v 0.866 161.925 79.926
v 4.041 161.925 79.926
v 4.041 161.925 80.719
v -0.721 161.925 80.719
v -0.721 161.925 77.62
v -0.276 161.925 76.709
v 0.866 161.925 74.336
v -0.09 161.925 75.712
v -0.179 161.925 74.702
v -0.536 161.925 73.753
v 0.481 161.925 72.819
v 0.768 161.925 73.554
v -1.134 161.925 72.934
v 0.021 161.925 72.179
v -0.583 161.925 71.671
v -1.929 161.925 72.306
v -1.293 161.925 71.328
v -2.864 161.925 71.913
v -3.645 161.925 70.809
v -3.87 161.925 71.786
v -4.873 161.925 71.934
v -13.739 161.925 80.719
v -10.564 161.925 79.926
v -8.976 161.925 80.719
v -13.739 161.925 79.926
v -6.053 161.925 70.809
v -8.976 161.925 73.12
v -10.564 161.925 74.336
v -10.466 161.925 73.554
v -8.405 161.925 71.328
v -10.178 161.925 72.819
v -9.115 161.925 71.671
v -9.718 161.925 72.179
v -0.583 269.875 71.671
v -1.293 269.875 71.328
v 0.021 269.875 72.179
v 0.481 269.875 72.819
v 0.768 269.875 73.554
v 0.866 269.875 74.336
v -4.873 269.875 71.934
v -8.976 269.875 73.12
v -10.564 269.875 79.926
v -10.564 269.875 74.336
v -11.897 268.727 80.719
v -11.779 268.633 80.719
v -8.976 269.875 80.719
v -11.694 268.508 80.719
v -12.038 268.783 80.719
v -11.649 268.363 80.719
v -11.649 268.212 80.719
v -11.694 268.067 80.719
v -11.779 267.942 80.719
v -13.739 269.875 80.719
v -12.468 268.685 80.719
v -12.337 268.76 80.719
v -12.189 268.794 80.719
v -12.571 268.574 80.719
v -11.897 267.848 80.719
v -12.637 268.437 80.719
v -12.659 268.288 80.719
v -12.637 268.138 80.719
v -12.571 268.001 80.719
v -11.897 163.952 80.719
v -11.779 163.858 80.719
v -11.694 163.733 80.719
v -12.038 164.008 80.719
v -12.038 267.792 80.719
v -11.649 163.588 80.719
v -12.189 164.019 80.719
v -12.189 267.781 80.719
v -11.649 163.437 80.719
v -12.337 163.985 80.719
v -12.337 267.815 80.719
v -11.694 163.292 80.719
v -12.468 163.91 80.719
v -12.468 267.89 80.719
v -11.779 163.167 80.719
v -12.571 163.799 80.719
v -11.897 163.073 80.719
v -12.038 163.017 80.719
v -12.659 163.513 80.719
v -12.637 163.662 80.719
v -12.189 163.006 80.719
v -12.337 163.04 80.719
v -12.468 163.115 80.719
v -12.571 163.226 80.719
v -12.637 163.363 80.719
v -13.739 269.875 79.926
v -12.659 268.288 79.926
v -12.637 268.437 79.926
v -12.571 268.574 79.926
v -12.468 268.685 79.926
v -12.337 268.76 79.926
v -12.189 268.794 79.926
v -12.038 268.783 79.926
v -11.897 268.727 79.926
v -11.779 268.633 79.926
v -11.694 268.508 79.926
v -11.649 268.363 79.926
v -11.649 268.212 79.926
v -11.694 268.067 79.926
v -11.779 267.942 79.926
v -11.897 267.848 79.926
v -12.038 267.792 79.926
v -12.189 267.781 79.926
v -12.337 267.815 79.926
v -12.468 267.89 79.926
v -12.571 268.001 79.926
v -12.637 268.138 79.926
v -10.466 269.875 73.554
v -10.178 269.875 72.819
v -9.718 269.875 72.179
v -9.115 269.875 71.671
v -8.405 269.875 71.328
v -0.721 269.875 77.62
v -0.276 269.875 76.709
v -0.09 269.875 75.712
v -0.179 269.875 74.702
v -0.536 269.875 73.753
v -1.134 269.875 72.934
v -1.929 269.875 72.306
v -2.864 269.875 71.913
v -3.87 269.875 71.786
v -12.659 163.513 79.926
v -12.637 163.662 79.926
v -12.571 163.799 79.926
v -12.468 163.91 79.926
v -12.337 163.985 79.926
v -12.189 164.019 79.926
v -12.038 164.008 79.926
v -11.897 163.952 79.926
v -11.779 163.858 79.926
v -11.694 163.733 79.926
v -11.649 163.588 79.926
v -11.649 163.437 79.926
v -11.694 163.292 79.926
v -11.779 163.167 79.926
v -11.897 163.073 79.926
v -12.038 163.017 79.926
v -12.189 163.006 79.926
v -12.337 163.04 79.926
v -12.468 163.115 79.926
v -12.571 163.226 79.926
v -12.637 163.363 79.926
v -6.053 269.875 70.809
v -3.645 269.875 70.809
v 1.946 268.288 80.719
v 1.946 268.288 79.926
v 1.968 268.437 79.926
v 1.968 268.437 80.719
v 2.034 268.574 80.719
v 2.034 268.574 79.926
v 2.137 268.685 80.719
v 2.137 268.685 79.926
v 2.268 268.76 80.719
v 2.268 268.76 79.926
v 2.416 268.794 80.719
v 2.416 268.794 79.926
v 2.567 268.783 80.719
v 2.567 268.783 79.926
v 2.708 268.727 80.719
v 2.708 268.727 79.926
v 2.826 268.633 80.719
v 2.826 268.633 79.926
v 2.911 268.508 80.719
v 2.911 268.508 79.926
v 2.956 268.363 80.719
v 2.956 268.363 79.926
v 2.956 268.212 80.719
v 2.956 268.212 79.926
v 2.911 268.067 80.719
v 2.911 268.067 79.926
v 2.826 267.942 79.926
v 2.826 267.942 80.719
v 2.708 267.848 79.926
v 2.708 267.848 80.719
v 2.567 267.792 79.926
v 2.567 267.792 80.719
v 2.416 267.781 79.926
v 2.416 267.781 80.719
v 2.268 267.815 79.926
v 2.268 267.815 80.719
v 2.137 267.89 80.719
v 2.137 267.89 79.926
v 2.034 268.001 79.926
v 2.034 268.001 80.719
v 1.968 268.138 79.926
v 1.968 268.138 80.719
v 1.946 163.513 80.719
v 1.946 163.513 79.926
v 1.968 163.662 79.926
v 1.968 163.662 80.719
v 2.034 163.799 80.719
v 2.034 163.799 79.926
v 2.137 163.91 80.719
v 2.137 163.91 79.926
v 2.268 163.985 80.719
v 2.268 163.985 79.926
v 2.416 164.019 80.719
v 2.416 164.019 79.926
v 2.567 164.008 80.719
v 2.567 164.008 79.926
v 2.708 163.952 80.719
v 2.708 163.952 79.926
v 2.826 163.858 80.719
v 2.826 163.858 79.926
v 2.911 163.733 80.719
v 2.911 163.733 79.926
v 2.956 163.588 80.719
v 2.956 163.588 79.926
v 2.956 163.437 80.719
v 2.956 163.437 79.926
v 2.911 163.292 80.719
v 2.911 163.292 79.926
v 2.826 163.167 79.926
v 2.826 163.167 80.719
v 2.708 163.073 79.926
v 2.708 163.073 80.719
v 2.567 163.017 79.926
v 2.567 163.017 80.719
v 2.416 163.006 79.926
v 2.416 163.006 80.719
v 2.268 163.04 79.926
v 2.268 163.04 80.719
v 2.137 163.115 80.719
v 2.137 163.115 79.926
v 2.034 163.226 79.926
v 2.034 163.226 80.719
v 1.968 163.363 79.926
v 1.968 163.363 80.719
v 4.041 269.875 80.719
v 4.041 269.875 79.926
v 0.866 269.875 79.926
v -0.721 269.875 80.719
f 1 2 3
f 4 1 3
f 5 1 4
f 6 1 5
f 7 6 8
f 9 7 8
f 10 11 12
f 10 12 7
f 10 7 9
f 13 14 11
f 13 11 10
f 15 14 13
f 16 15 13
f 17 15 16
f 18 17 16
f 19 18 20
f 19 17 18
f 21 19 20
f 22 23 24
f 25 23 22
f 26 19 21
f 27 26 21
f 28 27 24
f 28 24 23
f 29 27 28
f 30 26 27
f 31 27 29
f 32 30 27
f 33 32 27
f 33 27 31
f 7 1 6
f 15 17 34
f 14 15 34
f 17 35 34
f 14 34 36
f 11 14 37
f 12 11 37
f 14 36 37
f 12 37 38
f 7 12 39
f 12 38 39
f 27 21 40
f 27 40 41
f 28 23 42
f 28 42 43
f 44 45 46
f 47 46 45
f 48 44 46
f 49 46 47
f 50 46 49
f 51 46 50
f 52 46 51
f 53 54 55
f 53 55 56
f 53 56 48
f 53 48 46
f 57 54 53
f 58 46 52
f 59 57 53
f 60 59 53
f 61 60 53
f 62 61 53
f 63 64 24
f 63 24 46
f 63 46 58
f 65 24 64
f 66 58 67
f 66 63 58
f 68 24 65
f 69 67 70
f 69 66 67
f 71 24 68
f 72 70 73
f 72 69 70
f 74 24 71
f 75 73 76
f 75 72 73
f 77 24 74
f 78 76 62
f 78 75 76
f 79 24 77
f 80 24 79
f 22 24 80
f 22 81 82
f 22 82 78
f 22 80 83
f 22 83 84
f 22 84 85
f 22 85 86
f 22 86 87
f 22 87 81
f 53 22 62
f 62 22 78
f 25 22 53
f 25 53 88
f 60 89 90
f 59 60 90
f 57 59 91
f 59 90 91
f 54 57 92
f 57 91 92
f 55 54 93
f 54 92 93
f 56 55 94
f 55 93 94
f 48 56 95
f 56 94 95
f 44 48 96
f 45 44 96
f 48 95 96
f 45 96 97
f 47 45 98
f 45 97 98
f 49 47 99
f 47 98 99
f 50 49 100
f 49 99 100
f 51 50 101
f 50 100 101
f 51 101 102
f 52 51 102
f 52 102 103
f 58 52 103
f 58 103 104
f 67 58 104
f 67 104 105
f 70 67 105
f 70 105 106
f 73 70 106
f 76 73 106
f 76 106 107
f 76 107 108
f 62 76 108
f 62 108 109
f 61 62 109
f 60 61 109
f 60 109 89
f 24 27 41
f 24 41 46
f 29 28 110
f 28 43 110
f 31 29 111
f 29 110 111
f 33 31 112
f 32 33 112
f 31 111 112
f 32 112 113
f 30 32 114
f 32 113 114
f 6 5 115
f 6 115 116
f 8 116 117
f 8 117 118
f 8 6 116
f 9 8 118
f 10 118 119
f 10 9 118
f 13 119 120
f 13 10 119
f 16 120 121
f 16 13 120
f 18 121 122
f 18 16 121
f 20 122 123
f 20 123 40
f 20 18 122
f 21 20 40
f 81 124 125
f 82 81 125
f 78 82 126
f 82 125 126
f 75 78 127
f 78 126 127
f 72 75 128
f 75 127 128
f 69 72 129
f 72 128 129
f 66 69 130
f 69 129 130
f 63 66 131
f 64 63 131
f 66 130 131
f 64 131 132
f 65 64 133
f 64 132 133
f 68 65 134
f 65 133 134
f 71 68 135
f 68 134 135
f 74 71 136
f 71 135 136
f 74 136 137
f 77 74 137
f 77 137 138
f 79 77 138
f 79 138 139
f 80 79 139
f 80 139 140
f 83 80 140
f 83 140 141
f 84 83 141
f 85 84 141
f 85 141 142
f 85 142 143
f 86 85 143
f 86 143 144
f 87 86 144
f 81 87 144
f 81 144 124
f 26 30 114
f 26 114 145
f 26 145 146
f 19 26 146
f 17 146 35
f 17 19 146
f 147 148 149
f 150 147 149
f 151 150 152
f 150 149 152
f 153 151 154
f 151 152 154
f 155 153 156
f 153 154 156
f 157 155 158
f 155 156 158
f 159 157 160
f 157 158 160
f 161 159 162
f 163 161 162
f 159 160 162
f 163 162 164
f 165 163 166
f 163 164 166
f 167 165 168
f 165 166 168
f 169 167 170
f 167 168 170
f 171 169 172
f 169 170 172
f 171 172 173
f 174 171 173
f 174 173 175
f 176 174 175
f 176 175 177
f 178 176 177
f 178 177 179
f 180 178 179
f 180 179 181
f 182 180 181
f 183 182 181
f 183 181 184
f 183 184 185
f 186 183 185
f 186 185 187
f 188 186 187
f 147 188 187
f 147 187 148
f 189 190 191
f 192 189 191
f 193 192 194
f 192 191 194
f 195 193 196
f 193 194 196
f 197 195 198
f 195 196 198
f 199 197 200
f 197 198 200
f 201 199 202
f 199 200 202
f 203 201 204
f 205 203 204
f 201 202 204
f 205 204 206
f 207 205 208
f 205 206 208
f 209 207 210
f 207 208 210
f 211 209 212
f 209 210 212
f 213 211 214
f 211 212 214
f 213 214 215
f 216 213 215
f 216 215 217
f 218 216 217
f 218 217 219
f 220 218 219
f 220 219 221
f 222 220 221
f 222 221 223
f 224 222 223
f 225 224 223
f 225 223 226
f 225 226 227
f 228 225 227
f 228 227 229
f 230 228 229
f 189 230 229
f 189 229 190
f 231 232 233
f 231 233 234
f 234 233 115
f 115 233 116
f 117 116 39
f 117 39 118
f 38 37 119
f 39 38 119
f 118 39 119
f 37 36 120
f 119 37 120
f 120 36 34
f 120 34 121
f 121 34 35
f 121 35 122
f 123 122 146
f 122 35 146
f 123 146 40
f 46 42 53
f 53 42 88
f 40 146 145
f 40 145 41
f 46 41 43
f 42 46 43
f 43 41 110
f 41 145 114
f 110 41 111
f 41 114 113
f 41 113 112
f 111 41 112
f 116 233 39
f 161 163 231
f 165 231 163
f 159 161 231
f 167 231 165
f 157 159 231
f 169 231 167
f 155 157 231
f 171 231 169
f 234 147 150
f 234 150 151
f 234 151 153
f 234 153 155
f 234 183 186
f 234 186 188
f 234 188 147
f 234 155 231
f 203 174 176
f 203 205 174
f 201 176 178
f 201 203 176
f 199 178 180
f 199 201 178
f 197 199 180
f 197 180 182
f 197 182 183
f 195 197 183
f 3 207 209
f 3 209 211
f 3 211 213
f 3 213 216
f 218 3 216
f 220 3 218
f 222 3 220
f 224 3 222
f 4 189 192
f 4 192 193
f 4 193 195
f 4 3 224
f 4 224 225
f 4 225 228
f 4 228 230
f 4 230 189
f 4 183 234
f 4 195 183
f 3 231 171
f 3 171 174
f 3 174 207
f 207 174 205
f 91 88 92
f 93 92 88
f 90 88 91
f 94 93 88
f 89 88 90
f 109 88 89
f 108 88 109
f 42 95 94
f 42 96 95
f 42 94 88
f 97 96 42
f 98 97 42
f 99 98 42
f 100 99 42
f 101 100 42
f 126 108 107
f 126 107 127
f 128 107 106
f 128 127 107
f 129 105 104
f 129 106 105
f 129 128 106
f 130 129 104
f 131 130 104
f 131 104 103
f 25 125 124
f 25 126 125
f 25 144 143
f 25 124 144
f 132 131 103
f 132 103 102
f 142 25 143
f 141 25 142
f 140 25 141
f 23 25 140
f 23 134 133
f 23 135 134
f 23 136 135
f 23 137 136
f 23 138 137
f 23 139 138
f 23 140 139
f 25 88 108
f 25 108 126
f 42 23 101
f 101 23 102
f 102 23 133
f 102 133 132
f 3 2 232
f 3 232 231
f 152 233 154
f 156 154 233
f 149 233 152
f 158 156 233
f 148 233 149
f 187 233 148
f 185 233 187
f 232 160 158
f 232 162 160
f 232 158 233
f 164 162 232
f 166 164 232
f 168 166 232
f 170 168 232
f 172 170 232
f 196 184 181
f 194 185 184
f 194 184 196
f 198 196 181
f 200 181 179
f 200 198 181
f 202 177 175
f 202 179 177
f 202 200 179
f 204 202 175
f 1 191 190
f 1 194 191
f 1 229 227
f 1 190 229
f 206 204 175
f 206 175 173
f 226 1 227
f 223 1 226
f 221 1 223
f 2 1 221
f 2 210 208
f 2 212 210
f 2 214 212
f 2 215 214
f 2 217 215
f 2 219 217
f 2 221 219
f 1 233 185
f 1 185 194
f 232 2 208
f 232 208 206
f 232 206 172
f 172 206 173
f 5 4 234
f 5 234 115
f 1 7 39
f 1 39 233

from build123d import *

# Parameters (mm, degrees)
BOSS_EXTRUDE1_DEPTH = 431.8
FILLET2_R           = 12.7
SKETCH2_R           = 2.032
CUT_EXTRUDE1_DEPTH  = 436.166892099
SCALE1_SCALE        = 0.25


with BuildPart() as part:
    # Sketch1 → Boss-Extrude1 (new body)
    with BuildSketch(Plane(origin=(0, 0, 0), x_dir=(1, 0, 0), z_dir=(0, 1, 0))):
        with BuildLine():
            Line((12.446, -95.666893232), (12.446, -83.267976842))
            ThreePointArc((12.446, -83.267976842), (12.103082443, -66.082532596), (-4.162019583, -60.523437125))
            Line((-4.162019583, -60.523437125), (-20.574, -65.268050741))
            Line((-20.574, -65.268050741), (-20.574, -84.572180345))
            Line((-20.574, -84.572180345), (-20.574, -95.666893232))
            Line((-20.574, -95.666893232), (-39.624, -95.666893232))
            Line((-39.624, -95.666893232), (-39.624, -92.491893232))
            Line((-39.624, -92.491893232), (-26.924, -92.491893232))
            Line((-26.924, -92.491893232), (-26.924, -62.093050741))
            ThreePointArc((-26.924, -62.093050741), (-4.064, -55.764211531), (18.796, -62.093050741))
            Line((18.796, -62.093050741), (18.796, -92.491893232))
            Line((18.796, -92.491893232), (31.496, -92.491893232))
            Line((31.496, -92.491893232), (31.496, -95.666893232))
            Line((31.496, -95.666893232), (12.446, -95.666893232))
        make_face()
    extrude(amount=BOSS_EXTRUDE1_DEPTH)

    # Fillet2
    fillet2_edges = [part.edges().sort_by_distance(p)[0] for p in [
        (-26.924, 215.9, 62.093050741),
        (18.796, 215.9, 62.093050741),
    ]]
    fillet(fillet2_edges, radius=FILLET2_R)

    # Sketch2 → Cut-Extrude1 (cut, through all)
    with BuildSketch(Plane(origin=(0, 0, 92.491893232), x_dir=(-1, 0, 0), z_dir=(0, 0, -1))):
        with Locations((-25.146, 425.45)):
            Circle(SKETCH2_R)
        with Locations((-25.146, 6.35)):
            Circle(SKETCH2_R)
        with Locations((33.274, 425.45)):
            Circle(SKETCH2_R)
        with Locations((33.274, 6.35)):
            Circle(SKETCH2_R)
    extrude(amount=-CUT_EXTRUDE1_DEPTH, mode=Mode.SUBTRACT)


with BuildPart() as part_1:
    # Scale1: scaled about (-5.110319003, 215.9, 75.736877767)
    add(part.part.scale(SCALE1_SCALE).moved(Location((-3.832739252, 161.925, 56.802658325))))


solid = part_1.part
